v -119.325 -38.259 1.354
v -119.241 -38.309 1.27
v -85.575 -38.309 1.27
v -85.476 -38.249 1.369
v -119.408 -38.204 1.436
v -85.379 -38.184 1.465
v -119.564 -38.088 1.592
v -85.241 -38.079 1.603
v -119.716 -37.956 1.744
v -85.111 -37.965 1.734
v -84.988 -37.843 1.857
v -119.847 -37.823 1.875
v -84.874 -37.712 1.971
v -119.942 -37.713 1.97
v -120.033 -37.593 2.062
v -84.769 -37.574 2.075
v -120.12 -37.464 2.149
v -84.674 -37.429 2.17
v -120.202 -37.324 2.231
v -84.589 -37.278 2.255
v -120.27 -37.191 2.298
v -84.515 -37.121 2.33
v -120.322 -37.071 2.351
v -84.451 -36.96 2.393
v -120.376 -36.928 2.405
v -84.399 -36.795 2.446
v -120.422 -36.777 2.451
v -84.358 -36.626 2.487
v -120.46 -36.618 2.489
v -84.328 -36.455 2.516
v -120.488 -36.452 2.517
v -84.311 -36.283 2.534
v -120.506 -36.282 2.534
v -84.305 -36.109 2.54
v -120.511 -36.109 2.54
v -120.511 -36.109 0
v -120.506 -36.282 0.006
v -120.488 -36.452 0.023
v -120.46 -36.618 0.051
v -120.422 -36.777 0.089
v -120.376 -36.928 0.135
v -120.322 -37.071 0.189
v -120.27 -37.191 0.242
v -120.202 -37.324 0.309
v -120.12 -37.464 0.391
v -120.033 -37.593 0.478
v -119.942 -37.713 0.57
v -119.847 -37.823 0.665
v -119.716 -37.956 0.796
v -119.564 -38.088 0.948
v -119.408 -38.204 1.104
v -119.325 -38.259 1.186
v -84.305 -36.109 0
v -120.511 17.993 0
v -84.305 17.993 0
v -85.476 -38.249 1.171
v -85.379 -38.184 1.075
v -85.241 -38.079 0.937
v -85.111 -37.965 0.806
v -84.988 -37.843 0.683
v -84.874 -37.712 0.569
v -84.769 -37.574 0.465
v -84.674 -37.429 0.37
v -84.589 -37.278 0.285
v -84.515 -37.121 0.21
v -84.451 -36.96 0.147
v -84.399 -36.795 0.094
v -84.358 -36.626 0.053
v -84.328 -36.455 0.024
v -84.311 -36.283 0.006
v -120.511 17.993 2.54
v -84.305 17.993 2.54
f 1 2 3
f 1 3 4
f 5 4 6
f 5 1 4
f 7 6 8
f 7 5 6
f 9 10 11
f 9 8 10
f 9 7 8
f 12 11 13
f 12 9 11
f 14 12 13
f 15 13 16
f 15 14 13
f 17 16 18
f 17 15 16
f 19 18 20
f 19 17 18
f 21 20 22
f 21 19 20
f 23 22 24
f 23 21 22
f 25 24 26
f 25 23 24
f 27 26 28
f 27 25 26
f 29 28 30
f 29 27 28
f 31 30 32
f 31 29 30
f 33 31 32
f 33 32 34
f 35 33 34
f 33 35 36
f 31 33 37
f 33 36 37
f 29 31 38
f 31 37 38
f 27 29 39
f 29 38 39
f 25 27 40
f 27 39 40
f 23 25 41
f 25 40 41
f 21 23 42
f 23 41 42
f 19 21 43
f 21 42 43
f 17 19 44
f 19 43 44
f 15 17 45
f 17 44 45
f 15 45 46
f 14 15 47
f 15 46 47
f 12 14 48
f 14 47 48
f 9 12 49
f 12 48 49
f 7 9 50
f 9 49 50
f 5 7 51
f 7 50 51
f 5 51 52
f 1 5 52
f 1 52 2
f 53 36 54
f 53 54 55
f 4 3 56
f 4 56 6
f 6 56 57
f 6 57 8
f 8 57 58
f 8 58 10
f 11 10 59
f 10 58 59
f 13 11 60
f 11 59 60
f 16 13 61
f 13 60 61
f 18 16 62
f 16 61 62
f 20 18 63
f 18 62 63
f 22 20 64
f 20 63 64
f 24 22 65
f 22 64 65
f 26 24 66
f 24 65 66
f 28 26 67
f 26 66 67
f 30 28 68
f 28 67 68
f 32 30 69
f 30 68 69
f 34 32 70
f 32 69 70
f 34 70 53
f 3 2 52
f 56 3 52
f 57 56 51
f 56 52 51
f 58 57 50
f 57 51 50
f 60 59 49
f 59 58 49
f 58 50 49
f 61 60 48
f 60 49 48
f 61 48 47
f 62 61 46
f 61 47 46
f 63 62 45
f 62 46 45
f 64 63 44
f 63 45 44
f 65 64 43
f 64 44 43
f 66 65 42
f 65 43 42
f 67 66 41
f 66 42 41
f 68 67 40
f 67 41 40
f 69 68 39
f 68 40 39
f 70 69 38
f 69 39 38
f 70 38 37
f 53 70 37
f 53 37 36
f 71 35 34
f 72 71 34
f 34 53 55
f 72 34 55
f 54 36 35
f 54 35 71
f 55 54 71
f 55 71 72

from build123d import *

# Parameters (mm, degrees)
F0_W        = 36.2067520618
F0_H        = 56.6427242011
F1_DEPTH    = 2.54
F2_T1_DEPTH = 15.24
F2_T3_DEPTH = 48.9067520618


# Not quite as in the source:
# - a fillet or chamfer that OpenCascade refuses, or shapes differently, is made with other operations: its cross-section is extruded or revolved along the edge and cut away or added


with BuildPart() as f1:
    # F0 (on Top) → F1 (new body)
    with BuildSketch(Plane.XY):
        with Locations((-102.4080365896, -10.3280926123)):
            Rectangle(F0_W, F0_H)
    extrude(amount=F1_DEPTH)

    # F2: fillet of radius 2.54 on 4 edges, made by hand

    # F2_s2 → F2_t1 (cut)
    with BuildSketch(Plane.XY.offset(-6.35)):
        with BuildLine():
            ThreePointArc((-120.5114126205, -36.1094547129), (-119.7674638448, -37.9055059371), (-117.9714126205, -38.6494547129))
            Line((-117.9714126205, -38.6494547129), (-120.5114126205, -38.6494547129))
            Line((-120.5114126205, -38.6494547129), (-120.5114126205, -36.1094547129))
        make_face()
        with BuildLine():
            ThreePointArc((-86.8446605587, -38.6494547129), (-85.0486093345, -37.9055059371), (-84.3046605587, -36.1094547129))
            Line((-84.3046605587, -36.1094547129), (-84.3046605587, -38.6494547129))
            Line((-84.3046605587, -38.6494547129), (-86.8446605587, -38.6494547129))
        make_face()
    extrude(amount=F2_T1_DEPTH, mode=Mode.SUBTRACT)

    # F2_s4 → F2_t3 (cut)
    with BuildSketch(Plane.YZ.offset(-126.8614126205)):
        with BuildLine():
            ThreePointArc((-38.6494547129, 2.54), (-37.9055059371, 0.7439487758), (-36.1094547129, 0))
            Line((-36.1094547129, 0), (-38.6494547129, 0))
            Line((-38.6494547129, 0), (-38.6494547129, 2.54))
        make_face()
        with BuildLine():
            ThreePointArc((-38.6494547129, 0), (-37.9055059371, 1.7960512242), (-36.1094547129, 2.54))
            Line((-36.1094547129, 2.54), (-38.6494547129, 2.54))
            Line((-38.6494547129, 2.54), (-38.6494547129, 0))
        make_face()
    extrude(amount=F2_T3_DEPTH, mode=Mode.SUBTRACT)


solid = f1.part
